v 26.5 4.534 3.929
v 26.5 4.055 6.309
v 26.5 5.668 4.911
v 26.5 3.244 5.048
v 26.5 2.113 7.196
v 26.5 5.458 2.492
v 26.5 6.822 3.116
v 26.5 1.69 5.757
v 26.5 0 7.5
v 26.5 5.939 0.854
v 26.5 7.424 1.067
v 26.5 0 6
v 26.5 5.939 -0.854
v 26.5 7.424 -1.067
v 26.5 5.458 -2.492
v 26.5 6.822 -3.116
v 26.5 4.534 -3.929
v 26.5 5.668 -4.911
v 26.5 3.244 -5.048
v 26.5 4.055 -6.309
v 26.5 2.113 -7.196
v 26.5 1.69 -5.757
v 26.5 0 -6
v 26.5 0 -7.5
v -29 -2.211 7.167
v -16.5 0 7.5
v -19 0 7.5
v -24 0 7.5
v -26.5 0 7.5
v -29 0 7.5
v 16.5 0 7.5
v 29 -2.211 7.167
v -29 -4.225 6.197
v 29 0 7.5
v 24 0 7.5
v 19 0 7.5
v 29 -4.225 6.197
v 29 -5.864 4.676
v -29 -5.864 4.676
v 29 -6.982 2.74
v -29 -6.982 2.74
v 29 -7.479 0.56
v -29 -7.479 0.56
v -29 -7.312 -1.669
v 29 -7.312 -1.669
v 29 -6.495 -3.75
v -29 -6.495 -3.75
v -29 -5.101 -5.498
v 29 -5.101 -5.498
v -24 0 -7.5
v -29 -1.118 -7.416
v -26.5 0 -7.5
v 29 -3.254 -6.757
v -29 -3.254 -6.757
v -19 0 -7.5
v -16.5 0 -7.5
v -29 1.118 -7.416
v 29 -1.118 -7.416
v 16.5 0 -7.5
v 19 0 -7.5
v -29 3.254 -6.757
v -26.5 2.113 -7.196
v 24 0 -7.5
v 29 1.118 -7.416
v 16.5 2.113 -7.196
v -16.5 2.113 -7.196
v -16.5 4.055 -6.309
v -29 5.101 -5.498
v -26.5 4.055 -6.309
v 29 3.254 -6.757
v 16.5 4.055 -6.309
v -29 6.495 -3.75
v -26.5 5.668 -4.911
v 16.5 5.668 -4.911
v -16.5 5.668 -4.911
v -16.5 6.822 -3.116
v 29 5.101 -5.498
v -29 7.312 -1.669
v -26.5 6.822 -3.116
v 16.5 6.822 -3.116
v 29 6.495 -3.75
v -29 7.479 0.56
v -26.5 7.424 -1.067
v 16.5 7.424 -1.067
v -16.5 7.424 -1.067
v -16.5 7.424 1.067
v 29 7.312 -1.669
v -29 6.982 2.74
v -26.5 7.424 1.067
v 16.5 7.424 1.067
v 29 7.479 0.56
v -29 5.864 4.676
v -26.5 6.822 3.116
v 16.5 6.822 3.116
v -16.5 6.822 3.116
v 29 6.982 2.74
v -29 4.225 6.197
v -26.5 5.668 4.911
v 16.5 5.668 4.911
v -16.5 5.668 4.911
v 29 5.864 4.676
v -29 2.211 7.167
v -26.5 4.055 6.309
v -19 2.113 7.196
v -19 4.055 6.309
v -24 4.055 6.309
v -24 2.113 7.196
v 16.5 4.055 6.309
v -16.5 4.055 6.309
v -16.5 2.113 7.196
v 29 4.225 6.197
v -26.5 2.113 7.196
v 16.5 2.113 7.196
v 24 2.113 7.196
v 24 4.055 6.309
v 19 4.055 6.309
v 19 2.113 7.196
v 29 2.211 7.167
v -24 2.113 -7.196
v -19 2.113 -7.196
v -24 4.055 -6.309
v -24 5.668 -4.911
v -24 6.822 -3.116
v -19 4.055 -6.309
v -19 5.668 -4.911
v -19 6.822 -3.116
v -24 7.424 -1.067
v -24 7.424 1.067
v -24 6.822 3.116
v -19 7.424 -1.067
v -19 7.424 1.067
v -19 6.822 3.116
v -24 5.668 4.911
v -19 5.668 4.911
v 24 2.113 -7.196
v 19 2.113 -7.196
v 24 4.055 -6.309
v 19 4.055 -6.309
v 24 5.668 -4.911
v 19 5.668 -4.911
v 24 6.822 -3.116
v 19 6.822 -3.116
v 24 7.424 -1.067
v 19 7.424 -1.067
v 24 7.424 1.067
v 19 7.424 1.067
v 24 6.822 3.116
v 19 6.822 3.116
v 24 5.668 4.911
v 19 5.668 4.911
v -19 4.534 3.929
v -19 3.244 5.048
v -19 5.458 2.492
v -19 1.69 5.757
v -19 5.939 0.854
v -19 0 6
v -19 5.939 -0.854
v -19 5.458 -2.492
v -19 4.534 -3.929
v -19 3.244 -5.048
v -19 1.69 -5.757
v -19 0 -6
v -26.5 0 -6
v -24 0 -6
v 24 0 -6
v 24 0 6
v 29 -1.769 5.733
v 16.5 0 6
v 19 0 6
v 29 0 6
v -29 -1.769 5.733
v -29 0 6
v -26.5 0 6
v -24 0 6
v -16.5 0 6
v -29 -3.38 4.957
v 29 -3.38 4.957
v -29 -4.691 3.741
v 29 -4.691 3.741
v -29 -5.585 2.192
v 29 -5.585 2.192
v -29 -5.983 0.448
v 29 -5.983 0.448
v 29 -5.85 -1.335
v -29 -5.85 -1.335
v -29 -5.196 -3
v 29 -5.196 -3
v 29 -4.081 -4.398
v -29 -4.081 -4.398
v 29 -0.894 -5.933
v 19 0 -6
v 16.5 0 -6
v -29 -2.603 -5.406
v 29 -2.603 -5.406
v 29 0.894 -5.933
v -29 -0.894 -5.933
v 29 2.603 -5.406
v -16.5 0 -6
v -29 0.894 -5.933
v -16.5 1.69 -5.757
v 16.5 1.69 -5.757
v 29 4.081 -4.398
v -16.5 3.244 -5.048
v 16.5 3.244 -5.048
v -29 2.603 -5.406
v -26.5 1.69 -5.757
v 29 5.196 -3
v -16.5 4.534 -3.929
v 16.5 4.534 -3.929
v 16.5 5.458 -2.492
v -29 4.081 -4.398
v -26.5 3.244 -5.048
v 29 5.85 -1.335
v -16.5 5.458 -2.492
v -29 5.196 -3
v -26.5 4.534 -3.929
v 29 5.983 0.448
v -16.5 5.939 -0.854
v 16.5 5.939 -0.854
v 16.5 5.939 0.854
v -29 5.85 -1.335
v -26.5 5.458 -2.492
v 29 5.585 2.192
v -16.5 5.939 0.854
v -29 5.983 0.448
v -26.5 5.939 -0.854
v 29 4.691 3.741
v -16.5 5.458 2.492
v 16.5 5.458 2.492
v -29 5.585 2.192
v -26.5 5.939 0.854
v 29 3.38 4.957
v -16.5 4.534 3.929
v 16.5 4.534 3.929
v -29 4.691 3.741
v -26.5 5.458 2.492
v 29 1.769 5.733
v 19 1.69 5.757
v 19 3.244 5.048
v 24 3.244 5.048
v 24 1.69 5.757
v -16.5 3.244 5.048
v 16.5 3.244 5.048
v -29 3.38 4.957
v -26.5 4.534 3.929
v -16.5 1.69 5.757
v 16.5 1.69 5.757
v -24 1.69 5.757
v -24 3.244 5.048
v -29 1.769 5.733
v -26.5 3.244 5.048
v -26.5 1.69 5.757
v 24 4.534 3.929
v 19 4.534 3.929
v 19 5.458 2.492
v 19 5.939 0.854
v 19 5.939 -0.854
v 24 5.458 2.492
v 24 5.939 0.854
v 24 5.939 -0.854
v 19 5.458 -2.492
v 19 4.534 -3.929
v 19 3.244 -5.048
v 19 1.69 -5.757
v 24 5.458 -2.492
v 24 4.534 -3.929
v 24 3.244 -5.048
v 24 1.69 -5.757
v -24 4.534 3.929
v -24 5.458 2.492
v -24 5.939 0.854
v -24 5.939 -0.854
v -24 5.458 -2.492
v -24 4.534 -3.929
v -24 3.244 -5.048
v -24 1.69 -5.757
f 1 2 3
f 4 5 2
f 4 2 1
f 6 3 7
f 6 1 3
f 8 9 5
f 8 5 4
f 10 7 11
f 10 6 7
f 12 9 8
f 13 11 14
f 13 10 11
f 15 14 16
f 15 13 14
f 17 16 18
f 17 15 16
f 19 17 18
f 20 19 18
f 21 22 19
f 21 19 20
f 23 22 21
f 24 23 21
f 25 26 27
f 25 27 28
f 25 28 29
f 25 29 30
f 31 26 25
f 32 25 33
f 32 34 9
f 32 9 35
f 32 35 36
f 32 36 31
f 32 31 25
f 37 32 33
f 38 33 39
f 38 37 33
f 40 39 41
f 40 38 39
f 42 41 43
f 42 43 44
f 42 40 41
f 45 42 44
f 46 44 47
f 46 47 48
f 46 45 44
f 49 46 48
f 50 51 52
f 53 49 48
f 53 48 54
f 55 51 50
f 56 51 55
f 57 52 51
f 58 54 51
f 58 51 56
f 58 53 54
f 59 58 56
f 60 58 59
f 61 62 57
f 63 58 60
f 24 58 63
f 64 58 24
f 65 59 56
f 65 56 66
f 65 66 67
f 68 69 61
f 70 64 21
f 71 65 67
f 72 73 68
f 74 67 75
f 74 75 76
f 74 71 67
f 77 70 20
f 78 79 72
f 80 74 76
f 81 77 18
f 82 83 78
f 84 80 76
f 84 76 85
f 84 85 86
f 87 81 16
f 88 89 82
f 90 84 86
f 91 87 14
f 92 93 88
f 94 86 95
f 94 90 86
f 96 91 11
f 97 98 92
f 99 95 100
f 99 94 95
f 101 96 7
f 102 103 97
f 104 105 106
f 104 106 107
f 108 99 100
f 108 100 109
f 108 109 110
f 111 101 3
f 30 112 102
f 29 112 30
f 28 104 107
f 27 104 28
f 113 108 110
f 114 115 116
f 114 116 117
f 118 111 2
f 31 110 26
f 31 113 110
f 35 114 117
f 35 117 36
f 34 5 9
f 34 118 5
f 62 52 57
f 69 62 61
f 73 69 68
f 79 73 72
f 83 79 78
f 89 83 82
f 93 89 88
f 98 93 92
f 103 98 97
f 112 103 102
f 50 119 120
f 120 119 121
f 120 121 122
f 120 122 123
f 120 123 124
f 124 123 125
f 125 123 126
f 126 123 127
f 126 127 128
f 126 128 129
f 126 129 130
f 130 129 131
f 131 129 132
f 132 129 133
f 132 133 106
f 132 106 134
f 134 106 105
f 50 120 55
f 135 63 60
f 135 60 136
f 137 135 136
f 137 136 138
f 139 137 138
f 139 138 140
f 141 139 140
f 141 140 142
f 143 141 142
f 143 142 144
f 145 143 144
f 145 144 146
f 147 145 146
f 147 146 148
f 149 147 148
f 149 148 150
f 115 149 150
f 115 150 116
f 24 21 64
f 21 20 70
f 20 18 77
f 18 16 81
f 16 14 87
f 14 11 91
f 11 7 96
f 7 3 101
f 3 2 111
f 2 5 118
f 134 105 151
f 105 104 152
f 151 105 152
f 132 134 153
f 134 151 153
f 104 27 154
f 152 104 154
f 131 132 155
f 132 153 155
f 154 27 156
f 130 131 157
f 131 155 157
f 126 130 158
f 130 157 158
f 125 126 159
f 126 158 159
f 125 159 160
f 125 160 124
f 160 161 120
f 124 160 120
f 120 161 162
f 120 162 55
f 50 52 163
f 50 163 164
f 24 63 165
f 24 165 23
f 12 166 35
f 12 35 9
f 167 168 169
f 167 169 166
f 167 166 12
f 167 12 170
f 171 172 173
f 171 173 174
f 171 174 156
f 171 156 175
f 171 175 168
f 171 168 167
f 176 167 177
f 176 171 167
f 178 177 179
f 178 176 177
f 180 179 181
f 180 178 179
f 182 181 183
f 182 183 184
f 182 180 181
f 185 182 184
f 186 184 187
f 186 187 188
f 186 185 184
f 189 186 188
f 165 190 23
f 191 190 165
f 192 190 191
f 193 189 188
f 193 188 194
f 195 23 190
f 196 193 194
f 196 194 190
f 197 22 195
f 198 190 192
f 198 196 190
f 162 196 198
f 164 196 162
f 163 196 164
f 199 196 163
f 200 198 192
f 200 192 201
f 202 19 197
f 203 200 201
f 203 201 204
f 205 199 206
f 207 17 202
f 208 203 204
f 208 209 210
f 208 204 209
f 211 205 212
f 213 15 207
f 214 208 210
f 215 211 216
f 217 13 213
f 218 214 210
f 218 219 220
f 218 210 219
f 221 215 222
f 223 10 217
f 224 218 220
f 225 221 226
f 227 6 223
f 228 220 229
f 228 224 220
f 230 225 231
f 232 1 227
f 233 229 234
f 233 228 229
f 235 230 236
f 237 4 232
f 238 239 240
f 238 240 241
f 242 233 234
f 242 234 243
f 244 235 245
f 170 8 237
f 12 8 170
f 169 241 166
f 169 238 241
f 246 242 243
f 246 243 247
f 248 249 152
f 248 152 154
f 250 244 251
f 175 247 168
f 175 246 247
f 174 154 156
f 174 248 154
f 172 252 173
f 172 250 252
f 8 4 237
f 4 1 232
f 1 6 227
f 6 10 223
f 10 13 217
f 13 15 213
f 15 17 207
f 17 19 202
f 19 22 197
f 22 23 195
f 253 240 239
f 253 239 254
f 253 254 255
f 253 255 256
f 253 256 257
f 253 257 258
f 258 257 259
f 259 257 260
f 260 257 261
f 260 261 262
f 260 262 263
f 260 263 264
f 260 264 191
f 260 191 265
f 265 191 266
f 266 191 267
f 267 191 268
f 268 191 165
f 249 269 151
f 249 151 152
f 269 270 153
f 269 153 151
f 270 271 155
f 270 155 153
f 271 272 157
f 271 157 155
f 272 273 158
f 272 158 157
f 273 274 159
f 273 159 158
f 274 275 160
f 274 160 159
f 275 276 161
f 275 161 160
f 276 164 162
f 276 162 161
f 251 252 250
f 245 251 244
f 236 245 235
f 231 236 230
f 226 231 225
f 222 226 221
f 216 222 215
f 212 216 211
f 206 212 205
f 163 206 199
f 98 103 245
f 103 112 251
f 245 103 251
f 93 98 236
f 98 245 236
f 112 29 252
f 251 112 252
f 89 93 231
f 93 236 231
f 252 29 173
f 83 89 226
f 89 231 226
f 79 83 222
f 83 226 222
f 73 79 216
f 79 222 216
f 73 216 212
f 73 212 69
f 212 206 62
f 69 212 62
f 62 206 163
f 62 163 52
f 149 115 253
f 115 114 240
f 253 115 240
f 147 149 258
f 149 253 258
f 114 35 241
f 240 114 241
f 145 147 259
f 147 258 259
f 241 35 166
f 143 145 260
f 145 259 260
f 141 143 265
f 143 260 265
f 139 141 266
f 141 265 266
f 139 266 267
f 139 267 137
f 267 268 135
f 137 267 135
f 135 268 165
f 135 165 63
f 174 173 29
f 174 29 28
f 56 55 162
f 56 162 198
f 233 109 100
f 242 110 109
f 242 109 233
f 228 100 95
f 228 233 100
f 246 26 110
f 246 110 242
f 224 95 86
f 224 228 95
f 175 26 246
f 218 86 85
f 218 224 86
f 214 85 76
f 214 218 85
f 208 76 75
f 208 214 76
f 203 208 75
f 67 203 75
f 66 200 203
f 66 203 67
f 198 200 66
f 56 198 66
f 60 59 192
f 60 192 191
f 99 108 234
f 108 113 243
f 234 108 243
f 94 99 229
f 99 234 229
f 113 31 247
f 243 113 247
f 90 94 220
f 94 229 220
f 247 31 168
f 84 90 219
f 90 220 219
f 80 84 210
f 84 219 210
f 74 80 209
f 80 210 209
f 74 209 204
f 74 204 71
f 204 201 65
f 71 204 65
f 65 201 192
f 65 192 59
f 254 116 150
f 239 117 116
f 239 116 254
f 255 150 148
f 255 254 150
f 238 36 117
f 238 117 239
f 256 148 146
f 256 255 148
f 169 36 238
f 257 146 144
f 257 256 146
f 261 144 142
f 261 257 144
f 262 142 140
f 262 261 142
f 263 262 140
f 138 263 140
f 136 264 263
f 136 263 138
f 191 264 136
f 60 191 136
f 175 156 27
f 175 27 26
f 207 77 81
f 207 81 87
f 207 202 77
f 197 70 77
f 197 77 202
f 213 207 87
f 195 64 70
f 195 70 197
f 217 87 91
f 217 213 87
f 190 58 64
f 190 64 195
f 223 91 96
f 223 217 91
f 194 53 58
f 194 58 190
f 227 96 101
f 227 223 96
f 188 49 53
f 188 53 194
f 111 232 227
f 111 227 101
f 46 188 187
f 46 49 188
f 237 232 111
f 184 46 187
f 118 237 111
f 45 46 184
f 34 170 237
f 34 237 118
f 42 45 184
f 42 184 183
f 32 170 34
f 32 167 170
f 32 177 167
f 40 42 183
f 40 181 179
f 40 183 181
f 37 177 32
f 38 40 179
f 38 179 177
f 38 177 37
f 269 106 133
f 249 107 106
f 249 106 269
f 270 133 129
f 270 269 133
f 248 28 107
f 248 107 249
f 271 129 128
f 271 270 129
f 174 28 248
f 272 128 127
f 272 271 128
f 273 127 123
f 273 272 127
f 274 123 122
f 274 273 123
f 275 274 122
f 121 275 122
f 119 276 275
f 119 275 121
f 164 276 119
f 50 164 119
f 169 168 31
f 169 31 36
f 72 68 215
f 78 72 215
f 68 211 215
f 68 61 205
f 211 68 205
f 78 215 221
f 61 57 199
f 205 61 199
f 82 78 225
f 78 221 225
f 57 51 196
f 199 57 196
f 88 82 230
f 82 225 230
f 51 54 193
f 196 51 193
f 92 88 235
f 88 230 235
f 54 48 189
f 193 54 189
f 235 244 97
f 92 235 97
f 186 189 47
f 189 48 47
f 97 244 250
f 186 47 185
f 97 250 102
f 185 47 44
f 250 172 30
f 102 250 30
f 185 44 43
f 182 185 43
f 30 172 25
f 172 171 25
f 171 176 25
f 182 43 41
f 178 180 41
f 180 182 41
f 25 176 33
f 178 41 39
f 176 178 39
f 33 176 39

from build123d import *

# Parameters (mm, degrees)
SKETCH2_R           = 7.5
SKETCH2_R_2         = 6
BOSS_EXTRUDE1_DEPTH = 29
CUT_EXTRUDE1_REACH  = 32.879
SKETCH4_W           = 2.5
SKETCH4_H           = 15


with BuildPart() as part:
    # Sketch2 → Boss-Extrude1 (new, symmetric)
    with BuildSketch(Plane(origin=(0, 0, 0), x_dir=(0, 0, -1), z_dir=(1, 0, 0))):
        with Locations(Location((0, 0, 0), (0, 0, 180))):
            Circle(SKETCH2_R)
        with Locations(Location((0, 0, 0), (0, 0, 180))):
            Circle(SKETCH2_R_2, mode=Mode.SUBTRACT)
    extrude(amount=BOSS_EXTRUDE1_DEPTH, both=True)

    # Sketch4 → Cut-Extrude1 (cut, up to next)
    with BuildSketch(Plane(origin=(0, 0, 0), x_dir=(1, 0, 0), z_dir=(0, 1, 0)), mode=Mode.PRIVATE) as cut_extrude1_sk1:
        with Locations((25.25, 0)):
            Rectangle(SKETCH4_W, SKETCH4_H)
    cut_extrude1_tool1 = extrude(cut_extrude1_sk1.sketch, amount=CUT_EXTRUDE1_REACH, mode=Mode.PRIVATE) & part.part
    # Sketch4 → Cut-Extrude1 (cut, up to next)
    with BuildSketch(Plane(origin=(0, 0, 0), x_dir=(1, 0, 0), z_dir=(0, 1, 0)), mode=Mode.PRIVATE) as cut_extrude1_sk2:
        with Locations((17.75, 0)):
            Rectangle(SKETCH4_W, SKETCH4_H)
    cut_extrude1_tool2 = extrude(cut_extrude1_sk2.sketch, amount=CUT_EXTRUDE1_REACH, mode=Mode.PRIVATE) & part.part
    # Sketch4 → Cut-Extrude1 (cut, up to next)
    with BuildSketch(Plane(origin=(0, 0, 0), x_dir=(1, 0, 0), z_dir=(0, 1, 0)), mode=Mode.PRIVATE) as cut_extrude1_sk3:
        with Locations((-17.75, 0)):
            Rectangle(SKETCH4_W, SKETCH4_H)
    cut_extrude1_tool3 = extrude(cut_extrude1_sk3.sketch, amount=CUT_EXTRUDE1_REACH, mode=Mode.PRIVATE) & part.part
    # Sketch4 → Cut-Extrude1 (cut, up to next)
    with BuildSketch(Plane(origin=(0, 0, 0), x_dir=(1, 0, 0), z_dir=(0, 1, 0)), mode=Mode.PRIVATE) as cut_extrude1_sk4:
        with Locations((-25.25, 0)):
            Rectangle(SKETCH4_W, SKETCH4_H)
    cut_extrude1_tool4 = extrude(cut_extrude1_sk4.sketch, amount=CUT_EXTRUDE1_REACH, mode=Mode.PRIVATE) & part.part
    add(cut_extrude1_tool1.solids().sort_by_distance((25.25, 0, 0))[0], mode=Mode.SUBTRACT)
    add(cut_extrude1_tool2.solids().sort_by_distance((17.75, 0, 0))[0], mode=Mode.SUBTRACT)
    add(cut_extrude1_tool3.solids().sort_by_distance((-17.75, 0, 0))[0], mode=Mode.SUBTRACT)
    add(cut_extrude1_tool4.solids().sort_by_distance((-25.25, 0, 0))[0], mode=Mode.SUBTRACT)


solid = part.part
